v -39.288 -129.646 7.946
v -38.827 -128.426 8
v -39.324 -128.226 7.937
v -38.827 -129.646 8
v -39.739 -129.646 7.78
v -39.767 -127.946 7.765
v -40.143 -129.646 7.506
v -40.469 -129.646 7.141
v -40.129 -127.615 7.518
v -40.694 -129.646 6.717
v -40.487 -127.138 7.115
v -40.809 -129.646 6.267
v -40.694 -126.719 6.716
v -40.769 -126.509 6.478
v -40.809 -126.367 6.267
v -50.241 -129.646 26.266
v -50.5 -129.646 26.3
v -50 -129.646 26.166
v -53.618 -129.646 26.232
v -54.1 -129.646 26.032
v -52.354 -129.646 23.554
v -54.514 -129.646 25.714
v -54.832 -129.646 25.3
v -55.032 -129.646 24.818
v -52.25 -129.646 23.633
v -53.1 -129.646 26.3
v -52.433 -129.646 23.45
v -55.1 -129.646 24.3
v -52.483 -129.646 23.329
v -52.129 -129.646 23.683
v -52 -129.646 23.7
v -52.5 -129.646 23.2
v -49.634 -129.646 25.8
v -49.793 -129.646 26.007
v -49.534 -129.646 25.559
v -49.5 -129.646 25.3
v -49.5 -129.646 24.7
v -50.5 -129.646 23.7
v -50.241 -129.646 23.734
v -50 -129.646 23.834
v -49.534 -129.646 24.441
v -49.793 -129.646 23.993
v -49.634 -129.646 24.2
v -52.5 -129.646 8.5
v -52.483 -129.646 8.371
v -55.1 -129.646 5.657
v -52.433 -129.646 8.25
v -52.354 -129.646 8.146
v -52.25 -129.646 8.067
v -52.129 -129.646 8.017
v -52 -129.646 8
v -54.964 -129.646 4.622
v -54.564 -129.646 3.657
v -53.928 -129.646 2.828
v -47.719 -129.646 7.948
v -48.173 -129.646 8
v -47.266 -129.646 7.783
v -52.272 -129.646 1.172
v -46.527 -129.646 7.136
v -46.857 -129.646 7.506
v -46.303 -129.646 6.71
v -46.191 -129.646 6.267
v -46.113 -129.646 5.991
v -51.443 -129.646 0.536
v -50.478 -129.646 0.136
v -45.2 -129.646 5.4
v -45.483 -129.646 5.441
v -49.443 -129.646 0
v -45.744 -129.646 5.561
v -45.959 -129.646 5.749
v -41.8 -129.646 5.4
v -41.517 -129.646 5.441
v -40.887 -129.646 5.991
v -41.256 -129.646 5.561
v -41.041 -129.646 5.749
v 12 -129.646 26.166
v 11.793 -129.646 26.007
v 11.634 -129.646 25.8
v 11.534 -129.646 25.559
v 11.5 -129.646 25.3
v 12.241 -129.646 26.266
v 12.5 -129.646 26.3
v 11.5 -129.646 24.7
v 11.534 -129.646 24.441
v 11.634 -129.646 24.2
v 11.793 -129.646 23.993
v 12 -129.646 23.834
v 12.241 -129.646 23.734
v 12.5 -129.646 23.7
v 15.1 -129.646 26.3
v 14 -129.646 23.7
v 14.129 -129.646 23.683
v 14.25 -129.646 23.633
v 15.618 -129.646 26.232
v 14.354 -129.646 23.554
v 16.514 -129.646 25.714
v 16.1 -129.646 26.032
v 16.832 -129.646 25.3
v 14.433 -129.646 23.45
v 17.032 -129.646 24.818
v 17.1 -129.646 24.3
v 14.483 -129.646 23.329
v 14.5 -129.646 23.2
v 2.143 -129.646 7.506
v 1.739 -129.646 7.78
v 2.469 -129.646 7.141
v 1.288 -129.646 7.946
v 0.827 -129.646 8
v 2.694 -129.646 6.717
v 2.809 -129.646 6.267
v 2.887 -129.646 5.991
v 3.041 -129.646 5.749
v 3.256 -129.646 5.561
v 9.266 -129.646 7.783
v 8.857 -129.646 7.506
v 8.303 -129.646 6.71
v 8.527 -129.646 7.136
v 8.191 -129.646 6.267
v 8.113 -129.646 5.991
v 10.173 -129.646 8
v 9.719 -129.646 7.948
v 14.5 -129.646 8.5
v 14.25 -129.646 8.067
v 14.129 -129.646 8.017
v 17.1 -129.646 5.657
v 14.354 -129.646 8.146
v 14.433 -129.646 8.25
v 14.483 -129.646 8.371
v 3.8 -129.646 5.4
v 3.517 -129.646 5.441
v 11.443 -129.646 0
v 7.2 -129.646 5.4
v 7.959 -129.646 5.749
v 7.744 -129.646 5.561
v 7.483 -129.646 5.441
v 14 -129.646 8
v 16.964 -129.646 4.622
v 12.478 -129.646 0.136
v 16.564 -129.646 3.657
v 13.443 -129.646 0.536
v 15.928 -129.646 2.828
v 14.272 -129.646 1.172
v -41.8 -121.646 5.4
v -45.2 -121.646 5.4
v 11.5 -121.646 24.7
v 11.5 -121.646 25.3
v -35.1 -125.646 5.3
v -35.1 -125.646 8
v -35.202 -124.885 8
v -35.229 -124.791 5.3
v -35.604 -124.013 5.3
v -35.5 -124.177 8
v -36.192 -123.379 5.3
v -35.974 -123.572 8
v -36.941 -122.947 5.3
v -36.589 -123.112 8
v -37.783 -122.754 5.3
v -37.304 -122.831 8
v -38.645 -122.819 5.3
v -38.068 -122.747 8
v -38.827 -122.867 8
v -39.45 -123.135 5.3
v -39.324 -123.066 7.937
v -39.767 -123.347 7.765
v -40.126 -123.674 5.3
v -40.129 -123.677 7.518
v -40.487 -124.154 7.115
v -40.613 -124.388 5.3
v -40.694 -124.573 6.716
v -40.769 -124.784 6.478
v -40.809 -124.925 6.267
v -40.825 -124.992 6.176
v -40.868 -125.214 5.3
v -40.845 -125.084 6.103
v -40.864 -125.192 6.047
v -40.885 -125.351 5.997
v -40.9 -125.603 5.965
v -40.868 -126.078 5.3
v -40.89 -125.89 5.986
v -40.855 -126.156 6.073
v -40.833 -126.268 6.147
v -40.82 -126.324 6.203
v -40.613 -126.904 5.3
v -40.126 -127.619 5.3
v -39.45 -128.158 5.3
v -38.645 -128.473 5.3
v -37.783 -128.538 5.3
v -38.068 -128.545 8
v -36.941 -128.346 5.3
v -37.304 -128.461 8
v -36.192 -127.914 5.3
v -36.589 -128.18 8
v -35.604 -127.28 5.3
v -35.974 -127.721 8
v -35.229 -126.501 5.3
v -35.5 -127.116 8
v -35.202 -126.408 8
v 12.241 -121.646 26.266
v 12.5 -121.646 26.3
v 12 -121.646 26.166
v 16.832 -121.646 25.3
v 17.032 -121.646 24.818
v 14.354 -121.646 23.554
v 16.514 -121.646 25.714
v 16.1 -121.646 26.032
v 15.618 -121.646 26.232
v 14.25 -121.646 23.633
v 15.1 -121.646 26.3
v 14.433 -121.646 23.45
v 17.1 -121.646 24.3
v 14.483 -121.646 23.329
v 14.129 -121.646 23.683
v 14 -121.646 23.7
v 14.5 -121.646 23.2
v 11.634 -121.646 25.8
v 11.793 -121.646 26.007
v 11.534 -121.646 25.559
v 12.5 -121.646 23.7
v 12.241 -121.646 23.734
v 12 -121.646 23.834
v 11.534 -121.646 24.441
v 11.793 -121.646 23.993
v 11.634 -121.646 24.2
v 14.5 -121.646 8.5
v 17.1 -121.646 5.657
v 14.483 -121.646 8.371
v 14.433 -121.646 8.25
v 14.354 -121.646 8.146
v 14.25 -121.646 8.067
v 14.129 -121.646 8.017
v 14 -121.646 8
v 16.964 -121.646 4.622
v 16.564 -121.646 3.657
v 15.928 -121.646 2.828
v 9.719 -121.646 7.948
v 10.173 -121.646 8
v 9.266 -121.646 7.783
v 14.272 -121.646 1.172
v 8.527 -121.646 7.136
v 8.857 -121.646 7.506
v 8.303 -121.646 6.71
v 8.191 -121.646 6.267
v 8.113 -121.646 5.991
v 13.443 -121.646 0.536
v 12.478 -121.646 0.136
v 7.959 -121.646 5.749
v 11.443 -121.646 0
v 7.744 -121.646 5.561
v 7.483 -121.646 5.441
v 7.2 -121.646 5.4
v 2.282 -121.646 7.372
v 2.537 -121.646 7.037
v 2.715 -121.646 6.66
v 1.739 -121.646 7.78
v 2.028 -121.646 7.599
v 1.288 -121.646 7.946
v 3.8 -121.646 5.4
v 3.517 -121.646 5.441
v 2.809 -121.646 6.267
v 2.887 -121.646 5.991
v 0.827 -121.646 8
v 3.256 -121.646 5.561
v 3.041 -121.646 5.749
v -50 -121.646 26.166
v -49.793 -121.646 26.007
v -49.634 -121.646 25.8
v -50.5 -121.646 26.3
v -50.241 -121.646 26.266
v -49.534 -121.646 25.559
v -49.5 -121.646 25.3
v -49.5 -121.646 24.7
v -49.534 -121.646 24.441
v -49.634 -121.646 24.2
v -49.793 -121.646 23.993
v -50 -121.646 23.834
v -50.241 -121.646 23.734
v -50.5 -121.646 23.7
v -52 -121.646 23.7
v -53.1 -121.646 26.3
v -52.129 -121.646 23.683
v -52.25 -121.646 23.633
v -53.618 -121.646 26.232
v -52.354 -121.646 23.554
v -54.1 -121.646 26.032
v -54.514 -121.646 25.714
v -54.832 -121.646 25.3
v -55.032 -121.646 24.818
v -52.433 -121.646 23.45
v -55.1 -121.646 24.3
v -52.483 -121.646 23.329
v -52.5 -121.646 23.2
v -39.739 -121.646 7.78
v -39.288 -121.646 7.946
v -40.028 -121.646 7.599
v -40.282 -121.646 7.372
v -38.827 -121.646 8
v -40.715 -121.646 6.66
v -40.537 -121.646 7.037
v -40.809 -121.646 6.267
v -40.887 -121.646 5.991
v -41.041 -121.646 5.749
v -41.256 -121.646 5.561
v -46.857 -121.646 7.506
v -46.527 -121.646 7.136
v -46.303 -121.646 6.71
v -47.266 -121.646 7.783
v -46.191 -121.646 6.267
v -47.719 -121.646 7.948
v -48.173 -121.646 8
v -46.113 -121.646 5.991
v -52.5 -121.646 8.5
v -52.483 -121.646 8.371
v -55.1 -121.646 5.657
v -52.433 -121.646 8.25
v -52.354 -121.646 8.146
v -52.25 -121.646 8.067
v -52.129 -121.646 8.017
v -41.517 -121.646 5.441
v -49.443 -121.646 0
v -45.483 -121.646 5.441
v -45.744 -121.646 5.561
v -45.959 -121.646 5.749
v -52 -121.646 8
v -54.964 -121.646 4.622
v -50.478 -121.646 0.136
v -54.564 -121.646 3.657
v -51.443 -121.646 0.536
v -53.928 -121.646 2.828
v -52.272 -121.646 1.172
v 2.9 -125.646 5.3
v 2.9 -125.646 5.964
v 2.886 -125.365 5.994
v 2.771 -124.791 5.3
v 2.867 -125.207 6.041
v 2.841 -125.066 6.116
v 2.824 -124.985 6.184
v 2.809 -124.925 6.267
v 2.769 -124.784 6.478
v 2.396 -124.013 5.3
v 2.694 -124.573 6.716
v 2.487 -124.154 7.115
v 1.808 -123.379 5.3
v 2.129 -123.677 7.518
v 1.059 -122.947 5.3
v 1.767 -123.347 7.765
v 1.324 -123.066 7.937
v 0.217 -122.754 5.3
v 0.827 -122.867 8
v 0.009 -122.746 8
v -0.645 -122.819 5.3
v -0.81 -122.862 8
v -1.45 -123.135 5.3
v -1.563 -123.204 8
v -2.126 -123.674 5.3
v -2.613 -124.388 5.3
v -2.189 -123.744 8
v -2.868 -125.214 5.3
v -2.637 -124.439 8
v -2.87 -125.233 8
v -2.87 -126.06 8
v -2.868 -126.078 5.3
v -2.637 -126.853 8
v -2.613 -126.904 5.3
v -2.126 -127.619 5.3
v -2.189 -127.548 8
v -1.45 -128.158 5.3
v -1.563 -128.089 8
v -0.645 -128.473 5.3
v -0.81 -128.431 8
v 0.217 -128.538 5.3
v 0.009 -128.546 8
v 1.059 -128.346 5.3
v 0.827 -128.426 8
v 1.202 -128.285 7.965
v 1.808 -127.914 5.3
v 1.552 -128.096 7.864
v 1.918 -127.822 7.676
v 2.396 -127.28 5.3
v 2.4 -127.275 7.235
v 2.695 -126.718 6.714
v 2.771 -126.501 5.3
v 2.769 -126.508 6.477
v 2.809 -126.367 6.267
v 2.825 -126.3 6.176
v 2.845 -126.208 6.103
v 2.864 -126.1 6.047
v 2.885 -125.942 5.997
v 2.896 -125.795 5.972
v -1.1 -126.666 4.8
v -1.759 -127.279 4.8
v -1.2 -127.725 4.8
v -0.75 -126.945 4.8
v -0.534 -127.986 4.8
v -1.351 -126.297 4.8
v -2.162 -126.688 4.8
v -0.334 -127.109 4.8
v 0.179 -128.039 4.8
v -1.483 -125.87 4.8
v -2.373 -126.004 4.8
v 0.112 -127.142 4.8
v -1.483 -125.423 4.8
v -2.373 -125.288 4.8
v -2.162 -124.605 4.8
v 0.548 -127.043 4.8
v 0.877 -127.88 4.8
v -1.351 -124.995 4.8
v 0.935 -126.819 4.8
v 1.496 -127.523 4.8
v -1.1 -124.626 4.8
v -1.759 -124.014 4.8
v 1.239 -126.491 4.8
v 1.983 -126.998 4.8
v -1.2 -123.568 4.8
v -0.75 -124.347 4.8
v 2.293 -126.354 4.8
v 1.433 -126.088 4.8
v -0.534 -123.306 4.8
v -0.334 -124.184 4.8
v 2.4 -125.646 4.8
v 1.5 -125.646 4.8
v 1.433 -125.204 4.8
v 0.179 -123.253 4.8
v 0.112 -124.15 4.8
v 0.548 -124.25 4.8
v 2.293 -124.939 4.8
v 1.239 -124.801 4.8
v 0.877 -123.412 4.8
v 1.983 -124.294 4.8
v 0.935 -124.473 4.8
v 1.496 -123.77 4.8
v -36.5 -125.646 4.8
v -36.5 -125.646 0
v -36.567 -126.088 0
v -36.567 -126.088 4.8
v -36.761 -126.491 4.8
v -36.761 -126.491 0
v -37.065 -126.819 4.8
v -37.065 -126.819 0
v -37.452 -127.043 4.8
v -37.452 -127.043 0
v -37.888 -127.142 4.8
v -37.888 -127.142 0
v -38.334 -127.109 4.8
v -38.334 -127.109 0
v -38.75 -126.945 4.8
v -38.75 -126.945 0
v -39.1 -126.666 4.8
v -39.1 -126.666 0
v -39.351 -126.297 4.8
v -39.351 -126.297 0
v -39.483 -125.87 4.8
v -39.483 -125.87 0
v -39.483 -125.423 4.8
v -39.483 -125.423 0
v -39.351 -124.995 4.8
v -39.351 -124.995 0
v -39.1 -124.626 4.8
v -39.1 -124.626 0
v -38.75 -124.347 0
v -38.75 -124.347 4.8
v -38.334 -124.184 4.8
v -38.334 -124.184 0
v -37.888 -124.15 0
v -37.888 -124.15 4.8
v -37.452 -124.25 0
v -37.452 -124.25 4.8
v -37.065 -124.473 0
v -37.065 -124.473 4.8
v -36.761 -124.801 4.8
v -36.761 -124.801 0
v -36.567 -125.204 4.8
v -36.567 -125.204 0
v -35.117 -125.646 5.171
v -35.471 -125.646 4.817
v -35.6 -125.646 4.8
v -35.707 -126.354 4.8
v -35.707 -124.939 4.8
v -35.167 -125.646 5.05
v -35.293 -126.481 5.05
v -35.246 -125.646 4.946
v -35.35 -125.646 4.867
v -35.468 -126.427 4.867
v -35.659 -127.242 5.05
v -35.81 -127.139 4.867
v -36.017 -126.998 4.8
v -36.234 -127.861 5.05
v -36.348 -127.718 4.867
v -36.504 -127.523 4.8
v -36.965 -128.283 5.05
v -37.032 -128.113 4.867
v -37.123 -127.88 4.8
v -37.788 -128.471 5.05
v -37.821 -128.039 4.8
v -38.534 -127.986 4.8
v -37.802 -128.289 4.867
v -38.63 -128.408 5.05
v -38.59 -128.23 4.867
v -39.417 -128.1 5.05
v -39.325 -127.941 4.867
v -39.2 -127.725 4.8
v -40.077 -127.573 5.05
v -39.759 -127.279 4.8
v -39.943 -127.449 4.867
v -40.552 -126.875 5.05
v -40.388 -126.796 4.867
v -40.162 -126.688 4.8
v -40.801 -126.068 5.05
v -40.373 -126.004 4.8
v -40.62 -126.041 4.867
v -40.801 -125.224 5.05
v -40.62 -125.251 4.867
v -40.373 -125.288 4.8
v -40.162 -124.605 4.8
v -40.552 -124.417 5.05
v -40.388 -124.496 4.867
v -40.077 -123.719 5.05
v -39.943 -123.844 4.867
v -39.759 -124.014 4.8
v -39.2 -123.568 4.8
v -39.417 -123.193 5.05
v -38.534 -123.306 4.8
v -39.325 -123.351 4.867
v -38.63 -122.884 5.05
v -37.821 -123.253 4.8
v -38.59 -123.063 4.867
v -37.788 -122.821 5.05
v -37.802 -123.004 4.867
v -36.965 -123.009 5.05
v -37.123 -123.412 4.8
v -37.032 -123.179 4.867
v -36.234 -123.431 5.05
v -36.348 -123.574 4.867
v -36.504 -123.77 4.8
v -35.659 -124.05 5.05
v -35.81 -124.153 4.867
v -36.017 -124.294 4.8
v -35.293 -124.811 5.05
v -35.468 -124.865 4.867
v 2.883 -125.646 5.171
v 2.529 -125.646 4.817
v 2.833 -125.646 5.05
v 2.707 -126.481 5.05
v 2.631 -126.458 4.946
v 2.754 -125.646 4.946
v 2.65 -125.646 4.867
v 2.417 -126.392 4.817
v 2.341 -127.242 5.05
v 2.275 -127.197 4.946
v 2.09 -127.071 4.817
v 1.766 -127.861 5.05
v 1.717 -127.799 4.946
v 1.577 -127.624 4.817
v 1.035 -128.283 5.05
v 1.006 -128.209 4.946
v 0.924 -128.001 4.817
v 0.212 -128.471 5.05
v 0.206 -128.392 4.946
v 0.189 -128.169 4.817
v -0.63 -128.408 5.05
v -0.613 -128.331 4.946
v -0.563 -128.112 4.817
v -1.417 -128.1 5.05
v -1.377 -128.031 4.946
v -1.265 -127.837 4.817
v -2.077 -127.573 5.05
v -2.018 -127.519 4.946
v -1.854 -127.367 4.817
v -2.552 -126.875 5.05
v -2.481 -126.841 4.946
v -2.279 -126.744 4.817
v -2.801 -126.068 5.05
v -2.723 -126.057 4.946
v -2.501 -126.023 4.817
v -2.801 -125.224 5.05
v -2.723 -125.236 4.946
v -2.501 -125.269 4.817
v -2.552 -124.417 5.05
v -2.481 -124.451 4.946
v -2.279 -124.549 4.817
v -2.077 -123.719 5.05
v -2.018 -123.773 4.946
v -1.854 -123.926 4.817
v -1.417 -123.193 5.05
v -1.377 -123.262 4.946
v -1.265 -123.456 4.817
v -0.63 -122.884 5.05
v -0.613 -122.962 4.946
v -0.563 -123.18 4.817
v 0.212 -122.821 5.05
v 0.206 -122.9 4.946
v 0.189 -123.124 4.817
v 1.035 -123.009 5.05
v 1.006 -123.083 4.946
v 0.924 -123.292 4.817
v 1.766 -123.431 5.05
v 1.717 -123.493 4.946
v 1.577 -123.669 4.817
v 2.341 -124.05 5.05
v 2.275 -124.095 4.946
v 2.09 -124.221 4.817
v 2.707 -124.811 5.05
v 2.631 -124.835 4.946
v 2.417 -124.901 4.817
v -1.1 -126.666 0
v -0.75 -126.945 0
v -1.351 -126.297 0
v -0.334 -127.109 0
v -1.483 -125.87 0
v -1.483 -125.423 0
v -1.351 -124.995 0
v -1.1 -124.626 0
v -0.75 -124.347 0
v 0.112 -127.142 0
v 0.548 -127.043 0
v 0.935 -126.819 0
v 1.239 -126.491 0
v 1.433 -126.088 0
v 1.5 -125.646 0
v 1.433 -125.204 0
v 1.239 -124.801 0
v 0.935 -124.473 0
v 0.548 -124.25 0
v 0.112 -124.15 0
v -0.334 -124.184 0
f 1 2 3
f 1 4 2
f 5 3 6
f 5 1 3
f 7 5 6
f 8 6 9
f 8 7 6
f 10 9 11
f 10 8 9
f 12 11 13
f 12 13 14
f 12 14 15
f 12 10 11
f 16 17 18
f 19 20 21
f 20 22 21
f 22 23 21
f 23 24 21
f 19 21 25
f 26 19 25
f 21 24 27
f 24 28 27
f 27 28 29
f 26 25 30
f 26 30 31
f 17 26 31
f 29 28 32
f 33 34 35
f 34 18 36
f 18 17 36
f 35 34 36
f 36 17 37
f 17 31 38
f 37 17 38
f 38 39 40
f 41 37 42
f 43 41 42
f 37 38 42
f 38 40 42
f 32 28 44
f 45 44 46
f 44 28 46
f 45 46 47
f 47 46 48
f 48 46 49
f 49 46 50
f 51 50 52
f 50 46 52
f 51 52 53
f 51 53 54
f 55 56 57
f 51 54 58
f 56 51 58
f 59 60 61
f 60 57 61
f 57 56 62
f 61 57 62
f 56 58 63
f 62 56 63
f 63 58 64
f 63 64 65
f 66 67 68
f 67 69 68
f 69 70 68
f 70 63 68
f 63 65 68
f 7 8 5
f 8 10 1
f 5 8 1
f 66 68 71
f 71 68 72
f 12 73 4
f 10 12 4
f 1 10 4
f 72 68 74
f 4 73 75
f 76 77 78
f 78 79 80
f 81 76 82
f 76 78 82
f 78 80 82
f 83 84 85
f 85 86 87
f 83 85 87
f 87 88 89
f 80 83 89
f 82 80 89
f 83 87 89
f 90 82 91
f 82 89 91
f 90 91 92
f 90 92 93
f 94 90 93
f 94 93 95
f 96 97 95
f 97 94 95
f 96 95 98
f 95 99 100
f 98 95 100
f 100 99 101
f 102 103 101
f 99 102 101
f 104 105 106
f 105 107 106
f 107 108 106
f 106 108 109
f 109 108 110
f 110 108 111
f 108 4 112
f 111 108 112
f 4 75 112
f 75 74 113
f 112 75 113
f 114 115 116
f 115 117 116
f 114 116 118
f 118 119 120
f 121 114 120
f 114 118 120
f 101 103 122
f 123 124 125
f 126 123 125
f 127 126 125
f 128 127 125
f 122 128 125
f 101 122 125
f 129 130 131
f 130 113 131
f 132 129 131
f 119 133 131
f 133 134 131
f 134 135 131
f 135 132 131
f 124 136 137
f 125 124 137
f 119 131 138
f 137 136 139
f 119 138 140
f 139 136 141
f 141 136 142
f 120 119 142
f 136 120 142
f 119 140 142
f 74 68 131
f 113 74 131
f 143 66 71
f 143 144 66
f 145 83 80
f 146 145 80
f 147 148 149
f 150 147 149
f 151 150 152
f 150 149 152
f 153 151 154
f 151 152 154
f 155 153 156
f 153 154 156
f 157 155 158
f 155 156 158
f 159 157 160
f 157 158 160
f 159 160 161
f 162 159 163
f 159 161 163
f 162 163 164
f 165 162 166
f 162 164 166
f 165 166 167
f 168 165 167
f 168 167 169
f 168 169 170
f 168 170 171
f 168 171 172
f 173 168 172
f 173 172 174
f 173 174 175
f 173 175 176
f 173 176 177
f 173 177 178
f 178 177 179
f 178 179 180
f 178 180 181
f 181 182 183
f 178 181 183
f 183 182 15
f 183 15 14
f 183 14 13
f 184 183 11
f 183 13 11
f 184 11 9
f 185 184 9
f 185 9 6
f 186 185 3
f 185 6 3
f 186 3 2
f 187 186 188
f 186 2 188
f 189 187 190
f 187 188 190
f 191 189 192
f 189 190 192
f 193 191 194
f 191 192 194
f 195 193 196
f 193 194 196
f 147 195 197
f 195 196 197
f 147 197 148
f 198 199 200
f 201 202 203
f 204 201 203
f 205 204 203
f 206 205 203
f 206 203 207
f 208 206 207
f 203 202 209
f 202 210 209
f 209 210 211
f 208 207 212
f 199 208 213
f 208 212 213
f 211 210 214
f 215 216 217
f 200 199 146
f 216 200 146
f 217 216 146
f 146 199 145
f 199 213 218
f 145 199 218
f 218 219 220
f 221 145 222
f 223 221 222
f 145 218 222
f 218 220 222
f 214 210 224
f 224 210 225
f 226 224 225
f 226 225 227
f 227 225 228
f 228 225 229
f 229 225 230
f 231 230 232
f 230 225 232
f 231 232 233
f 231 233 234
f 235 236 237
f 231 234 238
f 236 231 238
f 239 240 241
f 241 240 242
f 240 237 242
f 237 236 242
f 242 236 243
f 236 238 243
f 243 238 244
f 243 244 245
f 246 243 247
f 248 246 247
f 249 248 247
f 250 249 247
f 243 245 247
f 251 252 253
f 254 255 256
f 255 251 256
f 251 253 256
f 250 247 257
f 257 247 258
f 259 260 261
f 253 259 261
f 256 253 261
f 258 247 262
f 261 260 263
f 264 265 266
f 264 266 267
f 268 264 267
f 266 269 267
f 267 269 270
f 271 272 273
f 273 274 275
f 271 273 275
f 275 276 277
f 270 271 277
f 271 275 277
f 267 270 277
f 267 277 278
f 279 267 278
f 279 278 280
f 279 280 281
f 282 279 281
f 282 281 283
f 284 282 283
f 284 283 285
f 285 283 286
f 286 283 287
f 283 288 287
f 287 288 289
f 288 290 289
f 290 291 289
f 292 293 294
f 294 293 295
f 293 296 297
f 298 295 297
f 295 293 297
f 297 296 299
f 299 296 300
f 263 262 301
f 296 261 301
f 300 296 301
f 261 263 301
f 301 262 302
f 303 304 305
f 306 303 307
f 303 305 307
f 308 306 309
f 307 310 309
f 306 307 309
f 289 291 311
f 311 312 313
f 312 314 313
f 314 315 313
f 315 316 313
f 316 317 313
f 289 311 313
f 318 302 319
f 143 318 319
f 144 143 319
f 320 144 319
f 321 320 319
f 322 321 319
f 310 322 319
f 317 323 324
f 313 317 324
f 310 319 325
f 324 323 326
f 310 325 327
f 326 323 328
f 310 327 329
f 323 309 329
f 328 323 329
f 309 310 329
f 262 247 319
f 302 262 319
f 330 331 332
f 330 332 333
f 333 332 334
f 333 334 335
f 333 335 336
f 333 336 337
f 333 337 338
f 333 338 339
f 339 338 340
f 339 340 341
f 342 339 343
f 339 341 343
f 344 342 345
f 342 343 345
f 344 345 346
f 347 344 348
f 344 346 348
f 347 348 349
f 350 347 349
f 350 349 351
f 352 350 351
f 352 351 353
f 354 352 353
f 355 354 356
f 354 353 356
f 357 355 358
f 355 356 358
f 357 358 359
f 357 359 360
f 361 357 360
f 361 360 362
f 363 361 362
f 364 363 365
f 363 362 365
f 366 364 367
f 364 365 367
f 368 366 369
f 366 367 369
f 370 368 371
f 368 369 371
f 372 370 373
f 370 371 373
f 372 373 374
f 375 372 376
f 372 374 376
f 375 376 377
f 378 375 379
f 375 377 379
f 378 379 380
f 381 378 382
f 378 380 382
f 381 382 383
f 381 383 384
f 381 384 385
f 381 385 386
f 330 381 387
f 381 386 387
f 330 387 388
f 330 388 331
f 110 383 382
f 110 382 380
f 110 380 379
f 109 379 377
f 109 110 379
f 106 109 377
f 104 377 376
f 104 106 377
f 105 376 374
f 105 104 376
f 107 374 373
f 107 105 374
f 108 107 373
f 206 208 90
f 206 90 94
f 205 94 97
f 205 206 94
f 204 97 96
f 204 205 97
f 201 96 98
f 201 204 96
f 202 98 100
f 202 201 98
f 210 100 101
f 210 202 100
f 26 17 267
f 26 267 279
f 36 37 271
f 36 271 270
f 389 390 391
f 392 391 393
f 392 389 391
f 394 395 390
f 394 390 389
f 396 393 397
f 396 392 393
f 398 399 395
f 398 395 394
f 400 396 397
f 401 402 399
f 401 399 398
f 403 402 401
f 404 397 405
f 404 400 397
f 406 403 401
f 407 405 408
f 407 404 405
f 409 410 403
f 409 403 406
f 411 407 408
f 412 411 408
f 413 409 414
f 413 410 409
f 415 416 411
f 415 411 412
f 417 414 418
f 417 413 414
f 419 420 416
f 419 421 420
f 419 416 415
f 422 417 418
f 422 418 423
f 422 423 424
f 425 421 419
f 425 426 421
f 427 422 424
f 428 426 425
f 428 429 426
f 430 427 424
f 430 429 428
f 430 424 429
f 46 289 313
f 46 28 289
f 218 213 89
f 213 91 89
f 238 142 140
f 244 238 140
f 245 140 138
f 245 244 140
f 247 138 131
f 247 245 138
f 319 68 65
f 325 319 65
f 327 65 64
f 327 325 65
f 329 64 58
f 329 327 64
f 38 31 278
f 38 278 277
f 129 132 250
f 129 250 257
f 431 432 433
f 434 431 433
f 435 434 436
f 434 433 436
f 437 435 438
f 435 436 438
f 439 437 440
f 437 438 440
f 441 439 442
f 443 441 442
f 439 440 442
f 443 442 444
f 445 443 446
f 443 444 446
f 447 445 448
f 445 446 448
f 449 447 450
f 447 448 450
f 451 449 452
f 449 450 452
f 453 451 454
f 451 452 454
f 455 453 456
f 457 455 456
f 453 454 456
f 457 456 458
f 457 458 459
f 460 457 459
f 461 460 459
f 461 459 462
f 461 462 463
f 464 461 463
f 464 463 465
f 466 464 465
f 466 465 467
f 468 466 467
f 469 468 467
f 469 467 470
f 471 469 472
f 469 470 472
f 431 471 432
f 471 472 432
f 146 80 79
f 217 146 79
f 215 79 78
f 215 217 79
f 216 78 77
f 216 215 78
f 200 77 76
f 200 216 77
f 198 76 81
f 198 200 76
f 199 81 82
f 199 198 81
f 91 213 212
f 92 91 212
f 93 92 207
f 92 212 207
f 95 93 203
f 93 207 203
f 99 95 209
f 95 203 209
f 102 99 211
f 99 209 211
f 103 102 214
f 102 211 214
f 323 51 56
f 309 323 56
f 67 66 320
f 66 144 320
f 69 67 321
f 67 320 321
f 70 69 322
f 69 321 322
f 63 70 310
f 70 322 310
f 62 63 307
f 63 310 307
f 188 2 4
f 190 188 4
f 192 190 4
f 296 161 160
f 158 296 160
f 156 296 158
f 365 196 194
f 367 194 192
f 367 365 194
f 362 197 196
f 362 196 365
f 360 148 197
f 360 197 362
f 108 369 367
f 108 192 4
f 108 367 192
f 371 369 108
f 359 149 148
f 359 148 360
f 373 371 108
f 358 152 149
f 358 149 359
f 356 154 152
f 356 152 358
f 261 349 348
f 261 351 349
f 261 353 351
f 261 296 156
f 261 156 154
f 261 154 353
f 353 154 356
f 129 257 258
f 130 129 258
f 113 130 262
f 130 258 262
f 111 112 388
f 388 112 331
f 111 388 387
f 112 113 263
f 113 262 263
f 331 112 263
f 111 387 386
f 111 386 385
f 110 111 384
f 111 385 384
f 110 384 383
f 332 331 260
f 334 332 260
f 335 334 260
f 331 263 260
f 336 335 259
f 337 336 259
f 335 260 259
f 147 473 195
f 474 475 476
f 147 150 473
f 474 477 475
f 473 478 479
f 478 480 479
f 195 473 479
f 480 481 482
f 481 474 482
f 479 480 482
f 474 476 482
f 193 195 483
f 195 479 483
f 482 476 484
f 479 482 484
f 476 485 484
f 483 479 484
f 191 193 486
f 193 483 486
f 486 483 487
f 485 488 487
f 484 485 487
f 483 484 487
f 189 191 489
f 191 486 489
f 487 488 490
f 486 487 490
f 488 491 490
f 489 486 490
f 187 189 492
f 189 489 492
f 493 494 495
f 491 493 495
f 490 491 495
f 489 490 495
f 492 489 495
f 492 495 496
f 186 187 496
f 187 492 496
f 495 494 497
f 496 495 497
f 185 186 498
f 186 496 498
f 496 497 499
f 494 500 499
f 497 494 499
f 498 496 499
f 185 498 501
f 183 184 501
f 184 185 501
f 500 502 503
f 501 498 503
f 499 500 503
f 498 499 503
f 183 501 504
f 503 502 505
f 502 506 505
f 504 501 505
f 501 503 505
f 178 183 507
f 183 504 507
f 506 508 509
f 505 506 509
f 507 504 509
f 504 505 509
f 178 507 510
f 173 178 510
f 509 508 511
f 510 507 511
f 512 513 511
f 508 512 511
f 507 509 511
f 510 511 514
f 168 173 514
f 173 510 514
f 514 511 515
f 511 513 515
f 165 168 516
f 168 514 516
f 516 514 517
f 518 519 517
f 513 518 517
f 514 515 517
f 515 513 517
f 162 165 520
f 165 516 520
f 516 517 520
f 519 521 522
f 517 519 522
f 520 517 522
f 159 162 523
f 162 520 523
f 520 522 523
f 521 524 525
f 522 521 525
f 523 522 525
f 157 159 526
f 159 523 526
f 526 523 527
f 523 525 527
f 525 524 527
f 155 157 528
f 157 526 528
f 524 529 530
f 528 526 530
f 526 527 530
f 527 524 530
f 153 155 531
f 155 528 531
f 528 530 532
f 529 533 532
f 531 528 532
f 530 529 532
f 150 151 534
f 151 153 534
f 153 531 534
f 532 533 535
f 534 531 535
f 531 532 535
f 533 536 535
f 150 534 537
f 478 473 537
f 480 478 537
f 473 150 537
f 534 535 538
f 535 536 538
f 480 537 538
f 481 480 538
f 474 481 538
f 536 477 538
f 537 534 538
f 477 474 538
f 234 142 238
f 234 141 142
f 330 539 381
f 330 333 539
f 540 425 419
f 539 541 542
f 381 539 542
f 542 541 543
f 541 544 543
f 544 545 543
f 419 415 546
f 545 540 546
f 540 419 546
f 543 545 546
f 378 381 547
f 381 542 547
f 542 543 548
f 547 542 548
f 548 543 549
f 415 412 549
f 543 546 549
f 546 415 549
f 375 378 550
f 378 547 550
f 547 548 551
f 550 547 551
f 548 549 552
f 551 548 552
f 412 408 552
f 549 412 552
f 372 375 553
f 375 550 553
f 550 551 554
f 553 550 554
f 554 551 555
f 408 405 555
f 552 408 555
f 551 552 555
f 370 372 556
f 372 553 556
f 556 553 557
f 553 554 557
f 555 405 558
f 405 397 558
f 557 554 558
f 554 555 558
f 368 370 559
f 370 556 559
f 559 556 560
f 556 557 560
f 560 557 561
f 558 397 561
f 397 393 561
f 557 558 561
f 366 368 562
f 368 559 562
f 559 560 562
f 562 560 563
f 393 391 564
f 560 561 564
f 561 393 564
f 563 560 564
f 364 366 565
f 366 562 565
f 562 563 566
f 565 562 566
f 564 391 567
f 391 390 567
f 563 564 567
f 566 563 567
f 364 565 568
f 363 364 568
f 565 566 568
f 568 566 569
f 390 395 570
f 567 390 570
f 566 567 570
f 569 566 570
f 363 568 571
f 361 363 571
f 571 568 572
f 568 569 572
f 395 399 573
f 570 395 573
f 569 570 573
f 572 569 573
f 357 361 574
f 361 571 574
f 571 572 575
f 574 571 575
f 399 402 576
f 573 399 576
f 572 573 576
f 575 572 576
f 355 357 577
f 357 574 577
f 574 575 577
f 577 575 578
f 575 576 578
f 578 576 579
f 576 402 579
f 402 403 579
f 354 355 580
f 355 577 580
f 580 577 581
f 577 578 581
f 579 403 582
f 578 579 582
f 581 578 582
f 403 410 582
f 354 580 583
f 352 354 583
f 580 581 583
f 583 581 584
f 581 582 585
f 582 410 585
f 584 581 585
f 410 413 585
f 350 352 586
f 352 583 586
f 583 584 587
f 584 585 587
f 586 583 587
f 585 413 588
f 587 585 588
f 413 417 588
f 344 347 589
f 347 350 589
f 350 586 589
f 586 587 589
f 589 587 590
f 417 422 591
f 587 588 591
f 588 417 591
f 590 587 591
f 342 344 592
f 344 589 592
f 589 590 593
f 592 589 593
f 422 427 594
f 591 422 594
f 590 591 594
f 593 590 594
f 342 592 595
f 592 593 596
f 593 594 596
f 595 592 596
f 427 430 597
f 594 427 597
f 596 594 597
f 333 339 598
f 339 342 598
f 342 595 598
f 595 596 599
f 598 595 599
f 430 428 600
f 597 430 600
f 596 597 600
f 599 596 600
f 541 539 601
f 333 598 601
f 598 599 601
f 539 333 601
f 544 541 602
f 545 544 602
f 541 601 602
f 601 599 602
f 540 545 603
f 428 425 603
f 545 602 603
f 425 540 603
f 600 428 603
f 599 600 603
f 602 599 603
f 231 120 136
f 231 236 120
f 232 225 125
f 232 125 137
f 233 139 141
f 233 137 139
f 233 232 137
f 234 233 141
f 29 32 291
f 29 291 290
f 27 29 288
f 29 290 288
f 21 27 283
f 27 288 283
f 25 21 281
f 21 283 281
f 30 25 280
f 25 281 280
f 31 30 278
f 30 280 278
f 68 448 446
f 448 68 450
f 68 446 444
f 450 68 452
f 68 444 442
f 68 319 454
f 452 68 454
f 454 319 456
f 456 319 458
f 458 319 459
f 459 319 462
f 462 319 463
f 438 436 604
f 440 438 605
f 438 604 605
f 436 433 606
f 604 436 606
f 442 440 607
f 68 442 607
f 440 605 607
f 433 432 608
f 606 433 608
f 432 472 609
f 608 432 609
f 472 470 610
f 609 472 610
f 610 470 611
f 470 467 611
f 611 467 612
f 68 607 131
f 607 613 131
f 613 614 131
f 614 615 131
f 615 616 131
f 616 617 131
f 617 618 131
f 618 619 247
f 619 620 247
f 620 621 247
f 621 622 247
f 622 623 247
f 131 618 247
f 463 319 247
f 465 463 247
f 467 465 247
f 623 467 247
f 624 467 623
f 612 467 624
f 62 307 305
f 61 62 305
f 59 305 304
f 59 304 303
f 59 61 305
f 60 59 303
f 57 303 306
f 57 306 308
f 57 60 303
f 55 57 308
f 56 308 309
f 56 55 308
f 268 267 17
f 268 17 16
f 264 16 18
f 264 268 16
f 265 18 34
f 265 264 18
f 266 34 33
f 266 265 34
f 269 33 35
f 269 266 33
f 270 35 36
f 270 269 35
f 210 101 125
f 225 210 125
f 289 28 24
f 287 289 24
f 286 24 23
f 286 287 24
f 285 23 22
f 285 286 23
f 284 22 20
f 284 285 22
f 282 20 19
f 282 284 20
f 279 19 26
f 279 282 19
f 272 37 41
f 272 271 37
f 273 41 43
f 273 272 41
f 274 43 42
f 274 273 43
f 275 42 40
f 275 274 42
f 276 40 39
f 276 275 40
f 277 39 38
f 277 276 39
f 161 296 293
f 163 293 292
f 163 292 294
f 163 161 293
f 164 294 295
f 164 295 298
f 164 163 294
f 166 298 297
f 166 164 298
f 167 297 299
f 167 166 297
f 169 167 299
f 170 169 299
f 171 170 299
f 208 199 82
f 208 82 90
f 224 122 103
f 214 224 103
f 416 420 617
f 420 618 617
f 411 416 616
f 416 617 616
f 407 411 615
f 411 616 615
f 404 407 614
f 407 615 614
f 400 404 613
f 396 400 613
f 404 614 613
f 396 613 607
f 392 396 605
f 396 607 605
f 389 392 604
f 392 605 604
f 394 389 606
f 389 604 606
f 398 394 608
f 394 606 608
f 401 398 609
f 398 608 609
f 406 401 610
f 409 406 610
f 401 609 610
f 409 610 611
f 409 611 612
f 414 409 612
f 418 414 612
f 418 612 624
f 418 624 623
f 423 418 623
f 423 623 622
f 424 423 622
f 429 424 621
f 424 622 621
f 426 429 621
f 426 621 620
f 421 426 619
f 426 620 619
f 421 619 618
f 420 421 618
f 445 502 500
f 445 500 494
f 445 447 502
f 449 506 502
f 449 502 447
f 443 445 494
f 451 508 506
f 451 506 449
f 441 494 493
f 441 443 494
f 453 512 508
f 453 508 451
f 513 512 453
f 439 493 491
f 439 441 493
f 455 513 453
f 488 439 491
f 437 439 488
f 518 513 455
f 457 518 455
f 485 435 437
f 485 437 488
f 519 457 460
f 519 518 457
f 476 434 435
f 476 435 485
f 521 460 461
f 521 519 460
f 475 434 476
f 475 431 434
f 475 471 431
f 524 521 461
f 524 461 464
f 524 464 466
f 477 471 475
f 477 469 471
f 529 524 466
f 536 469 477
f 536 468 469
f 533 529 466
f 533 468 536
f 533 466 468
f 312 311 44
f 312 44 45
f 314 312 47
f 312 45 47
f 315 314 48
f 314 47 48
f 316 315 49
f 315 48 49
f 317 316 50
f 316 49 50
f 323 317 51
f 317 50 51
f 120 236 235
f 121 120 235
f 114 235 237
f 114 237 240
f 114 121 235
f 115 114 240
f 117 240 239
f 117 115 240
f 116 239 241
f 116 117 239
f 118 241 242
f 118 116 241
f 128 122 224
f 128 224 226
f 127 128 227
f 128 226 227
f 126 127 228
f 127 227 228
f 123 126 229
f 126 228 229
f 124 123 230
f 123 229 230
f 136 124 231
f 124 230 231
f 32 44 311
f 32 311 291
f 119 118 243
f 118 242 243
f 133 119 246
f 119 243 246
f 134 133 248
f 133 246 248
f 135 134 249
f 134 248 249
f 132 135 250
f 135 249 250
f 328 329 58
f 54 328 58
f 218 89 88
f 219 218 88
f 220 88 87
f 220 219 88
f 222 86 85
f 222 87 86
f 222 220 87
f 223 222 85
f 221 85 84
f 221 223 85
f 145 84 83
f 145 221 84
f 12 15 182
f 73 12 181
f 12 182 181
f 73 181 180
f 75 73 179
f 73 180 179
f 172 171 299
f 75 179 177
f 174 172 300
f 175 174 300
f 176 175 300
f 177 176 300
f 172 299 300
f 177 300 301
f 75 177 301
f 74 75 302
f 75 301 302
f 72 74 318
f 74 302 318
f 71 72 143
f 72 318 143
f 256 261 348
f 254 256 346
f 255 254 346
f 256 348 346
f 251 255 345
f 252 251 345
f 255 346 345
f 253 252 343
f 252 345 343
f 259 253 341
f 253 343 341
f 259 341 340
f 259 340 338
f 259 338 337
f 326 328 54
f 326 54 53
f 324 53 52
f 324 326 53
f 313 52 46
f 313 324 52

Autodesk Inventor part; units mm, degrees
ref_plane "YZ Plane" through (0, 0, 0) normal (1, 0, 0) x (0, 1, 0)
ref_plane "XZ Plane" through (0, 0, 0) normal (0, 1, 0) x (-1, 0, 0)
ref_plane "Work Plane1" through (0, 0, 0) normal (0, 0, 1) x (1, 0, 0)
sketch "base_sketch" plane through (0, 0, 0) normal (0, 0, 1) x (1, 0, 0)
  circle A0 centre (0, -125.6462) radius 1.5 projected
  circle A1 centre (-38, -125.6462) radius 1.5 projected
  line L0 (14.5, -121.6462) -> (-52.5, -121.6462)
  line L1 (-52.5, -121.6462) -> (-52.5, -129.6462)
  line L2 (-52.5, -129.6462) -> (14.5, -129.6462)
  line L3 (14.5, -129.6462) -> (14.5, -121.6462)
  line L4 (-19, -121.6462) -> (-19, -129.6462) construction
  point P0 (0, 0)
  dimension "d1" = 67
  dimension "d4" = 38
  dimension "d5" = 19
  dimension "d6" = 4
  dimension "d7" = 4
extrude "base" add sketch "base_sketch" along normal blind 8
sketch "holes_bolt_head_sketch" plane through (0, 0, 8) normal (0, 0, 1) x (1, 0, 0)
  circle A0 centre (0, -125.6462) radius 1.5 construction
  circle A1 centre (0, -125.6462) radius 2.9
  circle A2 centre (-38, -125.6462) radius 1.5 construction
  circle A3 centre (-38, -125.6462) radius 2.9
  point P0 (0, 0)
  dimension "d10" = 5.8
  dimension "d11" = 5.8
extrude "holes_bolt_head" cut sketch "holes_bolt_head_sketch" against normal blind 3.2
fillet "bolt_head_fillet" radius 0.5 2 edges at (-40.9, -125.6462, 4.8) (-2.9, -125.6462, 4.8)
sketch "walls_sketch" plane through (-52.5, -129.6462, 0) normal (0, -1, 0) x (1, 0, 0)
  line L0 (0, 0) -> (67, 0) projected
  line L1 (67, 0) -> (67, 8) projected
  line L2 (0, 8) -> (67, 8) projected
  line L3 (0, 0) -> (0, 8) projected
  line L4 (67, 8) -> (0, 8) projected
  line L5 (0, 8) -> (0, 23.7)
  line L6 (0, 23.7) -> (3, 23.7)
  line L7 (0, 23.7) -> (3, 23.7) construction
  line L8 (3, 23.7) -> (3, 26.3)
  line L9 (3, 26.3) -> (-2.6, 26.3)
  line L10 (-2.6, 26.3) -> (-2.6, 0)
  line L11 (0, 0) -> (67, 0) projected
  line L12 (-2.6, 0) -> (0, 0)
  line L13 (0, 0) -> (0, 8) projected
  line L14 (33.5, 8) -> (33.5, 0) construction
  line L15 (67, 8) -> (67, 23.7)
  line L16 (67, 23.7) -> (64, 23.7)
  line L17 (64, 23.7) -> (64, 26.3)
  line L18 (64, 26.3) -> (69.6, 26.3)
  line L19 (69.6, 26.3) -> (69.6, 0)
  line L20 (69.6, 0) -> (67, 0)
  point P0 (52.5, 0)
  dimension "d15" = 15.7
  dimension "d16" = 3
  dimension "d17" = 0
  dimension "d18" = 2.6
  dimension "d19" = 2.6
extrude "walls" add sketch "walls_sketch" against normal up to surface (8 mm away) contours L12 L10 L9 L8 L6 L5 L3 | L1 L15 L16 L17 L18 L19 L20
fillet "wall_top" radius 2 2 edges at (-55.1, -125.6462, 26.3) (17.1, -125.6462, 26.3)
fillet "wall_tooth" radius 1 4 edges at (-49.5, -125.6462, 26.3) (-49.5, -125.6462, 23.7) (11.5, -125.6462, 23.7) (11.5, -125.6462, 26.3)
chamfer "wall_bottom" distance 4 angle 45 2 edges at (17.1, -125.6462, 0) (-55.1, -125.6462, 0)
fillet "wall_bottom_fillet" radius 4 4 edges at (-55.1, -125.6462, 4) (17.1, -125.6462, 4) (13.1, -125.6462, 0) (-51.1, -125.6462, 0)
fillet "inside" radius 0.5 4 edges at (14.5, -125.6462, 8) (-52.5, -125.6462, 8) (-52.5, -125.6462, 23.7) (14.5, -125.6462, 23.7)
sketch "groove_enclosure_bolt_sketch" plane through (-53.1, -121.6462, 26.3) normal (0, 1, 0) x (1, 0, 0)
  line L0 (67.1, 18.3) -> (1.1, 18.3) projected
  line L1 (55.9, 18.3) -> (61.3, 18.3)
  line L2 (61.3, 18.3) -> (61.3, 19.9)
  line L3 (60.3, 20.9) -> (56.9, 20.9)
  line L4 (55.9, 19.9) -> (55.9, 18.3)
  line L5 (34.1, 18.3) -> (34.1, 26.3) construction
  line L6 (3.6569, 26.3) -> (64.5431, 26.3) projected
  arc A0 (56.9, 20.9) -> (55.9, 19.9) centre (56.9, 19.9) ccw
  arc A1 (61.3, 19.9) -> (60.3, 20.9) centre (60.3, 19.9) ccw
  line L7 (12.3, 18.3) -> (6.9, 18.3)
  line L8 (6.9, 18.3) -> (6.9, 19.9)
  line L9 (7.9, 20.9) -> (11.3, 20.9)
  line L10 (12.3, 19.9) -> (12.3, 18.3)
  arc A2 (12.3, 19.9) -> (11.3, 20.9) centre (11.3, 19.9) ccw
  arc A3 (7.9, 20.9) -> (6.9, 19.9) centre (7.9, 19.9) ccw
  point P0 (53.1, 26.3)
  point P1 (61.3, 20.9)
  point P2 (55.9, 20.9)
  point P3 (58.6, 20.9)
  point P4 (6.9, 18.3)
  point P5 (12.3, 18.3)
  dimension "d29" = 66
  dimension "d30" = 33
  dimension "d31" = 49
  dimension "d32" = 5.4
  dimension "d33" = 2.6
  dimension "d34" = 1
extrude "groove_enclosure_bolt" cut sketch "groove_enclosure_bolt_sketch" against normal through all
fillet "groove_enclosure_bolt_rounded" radius 2 6 edges at (8.2, -125.6462, 8) (2.8, -123.2687, 8) (2.8, -128.0237, 8) (-40.8, -123.2687, 8) (-40.8, -128.0237, 8) (-46.2, -125.6462, 8)
equation "\"d5\" = 0.5 * d4"
equation "\"d7\" = d6"
equation "\"d10\" = d11"
equation "\"d30\" = 0.5 * d29"
properties part number "mount_enclosure_coral_dev_board" material "ABS Plastic"
